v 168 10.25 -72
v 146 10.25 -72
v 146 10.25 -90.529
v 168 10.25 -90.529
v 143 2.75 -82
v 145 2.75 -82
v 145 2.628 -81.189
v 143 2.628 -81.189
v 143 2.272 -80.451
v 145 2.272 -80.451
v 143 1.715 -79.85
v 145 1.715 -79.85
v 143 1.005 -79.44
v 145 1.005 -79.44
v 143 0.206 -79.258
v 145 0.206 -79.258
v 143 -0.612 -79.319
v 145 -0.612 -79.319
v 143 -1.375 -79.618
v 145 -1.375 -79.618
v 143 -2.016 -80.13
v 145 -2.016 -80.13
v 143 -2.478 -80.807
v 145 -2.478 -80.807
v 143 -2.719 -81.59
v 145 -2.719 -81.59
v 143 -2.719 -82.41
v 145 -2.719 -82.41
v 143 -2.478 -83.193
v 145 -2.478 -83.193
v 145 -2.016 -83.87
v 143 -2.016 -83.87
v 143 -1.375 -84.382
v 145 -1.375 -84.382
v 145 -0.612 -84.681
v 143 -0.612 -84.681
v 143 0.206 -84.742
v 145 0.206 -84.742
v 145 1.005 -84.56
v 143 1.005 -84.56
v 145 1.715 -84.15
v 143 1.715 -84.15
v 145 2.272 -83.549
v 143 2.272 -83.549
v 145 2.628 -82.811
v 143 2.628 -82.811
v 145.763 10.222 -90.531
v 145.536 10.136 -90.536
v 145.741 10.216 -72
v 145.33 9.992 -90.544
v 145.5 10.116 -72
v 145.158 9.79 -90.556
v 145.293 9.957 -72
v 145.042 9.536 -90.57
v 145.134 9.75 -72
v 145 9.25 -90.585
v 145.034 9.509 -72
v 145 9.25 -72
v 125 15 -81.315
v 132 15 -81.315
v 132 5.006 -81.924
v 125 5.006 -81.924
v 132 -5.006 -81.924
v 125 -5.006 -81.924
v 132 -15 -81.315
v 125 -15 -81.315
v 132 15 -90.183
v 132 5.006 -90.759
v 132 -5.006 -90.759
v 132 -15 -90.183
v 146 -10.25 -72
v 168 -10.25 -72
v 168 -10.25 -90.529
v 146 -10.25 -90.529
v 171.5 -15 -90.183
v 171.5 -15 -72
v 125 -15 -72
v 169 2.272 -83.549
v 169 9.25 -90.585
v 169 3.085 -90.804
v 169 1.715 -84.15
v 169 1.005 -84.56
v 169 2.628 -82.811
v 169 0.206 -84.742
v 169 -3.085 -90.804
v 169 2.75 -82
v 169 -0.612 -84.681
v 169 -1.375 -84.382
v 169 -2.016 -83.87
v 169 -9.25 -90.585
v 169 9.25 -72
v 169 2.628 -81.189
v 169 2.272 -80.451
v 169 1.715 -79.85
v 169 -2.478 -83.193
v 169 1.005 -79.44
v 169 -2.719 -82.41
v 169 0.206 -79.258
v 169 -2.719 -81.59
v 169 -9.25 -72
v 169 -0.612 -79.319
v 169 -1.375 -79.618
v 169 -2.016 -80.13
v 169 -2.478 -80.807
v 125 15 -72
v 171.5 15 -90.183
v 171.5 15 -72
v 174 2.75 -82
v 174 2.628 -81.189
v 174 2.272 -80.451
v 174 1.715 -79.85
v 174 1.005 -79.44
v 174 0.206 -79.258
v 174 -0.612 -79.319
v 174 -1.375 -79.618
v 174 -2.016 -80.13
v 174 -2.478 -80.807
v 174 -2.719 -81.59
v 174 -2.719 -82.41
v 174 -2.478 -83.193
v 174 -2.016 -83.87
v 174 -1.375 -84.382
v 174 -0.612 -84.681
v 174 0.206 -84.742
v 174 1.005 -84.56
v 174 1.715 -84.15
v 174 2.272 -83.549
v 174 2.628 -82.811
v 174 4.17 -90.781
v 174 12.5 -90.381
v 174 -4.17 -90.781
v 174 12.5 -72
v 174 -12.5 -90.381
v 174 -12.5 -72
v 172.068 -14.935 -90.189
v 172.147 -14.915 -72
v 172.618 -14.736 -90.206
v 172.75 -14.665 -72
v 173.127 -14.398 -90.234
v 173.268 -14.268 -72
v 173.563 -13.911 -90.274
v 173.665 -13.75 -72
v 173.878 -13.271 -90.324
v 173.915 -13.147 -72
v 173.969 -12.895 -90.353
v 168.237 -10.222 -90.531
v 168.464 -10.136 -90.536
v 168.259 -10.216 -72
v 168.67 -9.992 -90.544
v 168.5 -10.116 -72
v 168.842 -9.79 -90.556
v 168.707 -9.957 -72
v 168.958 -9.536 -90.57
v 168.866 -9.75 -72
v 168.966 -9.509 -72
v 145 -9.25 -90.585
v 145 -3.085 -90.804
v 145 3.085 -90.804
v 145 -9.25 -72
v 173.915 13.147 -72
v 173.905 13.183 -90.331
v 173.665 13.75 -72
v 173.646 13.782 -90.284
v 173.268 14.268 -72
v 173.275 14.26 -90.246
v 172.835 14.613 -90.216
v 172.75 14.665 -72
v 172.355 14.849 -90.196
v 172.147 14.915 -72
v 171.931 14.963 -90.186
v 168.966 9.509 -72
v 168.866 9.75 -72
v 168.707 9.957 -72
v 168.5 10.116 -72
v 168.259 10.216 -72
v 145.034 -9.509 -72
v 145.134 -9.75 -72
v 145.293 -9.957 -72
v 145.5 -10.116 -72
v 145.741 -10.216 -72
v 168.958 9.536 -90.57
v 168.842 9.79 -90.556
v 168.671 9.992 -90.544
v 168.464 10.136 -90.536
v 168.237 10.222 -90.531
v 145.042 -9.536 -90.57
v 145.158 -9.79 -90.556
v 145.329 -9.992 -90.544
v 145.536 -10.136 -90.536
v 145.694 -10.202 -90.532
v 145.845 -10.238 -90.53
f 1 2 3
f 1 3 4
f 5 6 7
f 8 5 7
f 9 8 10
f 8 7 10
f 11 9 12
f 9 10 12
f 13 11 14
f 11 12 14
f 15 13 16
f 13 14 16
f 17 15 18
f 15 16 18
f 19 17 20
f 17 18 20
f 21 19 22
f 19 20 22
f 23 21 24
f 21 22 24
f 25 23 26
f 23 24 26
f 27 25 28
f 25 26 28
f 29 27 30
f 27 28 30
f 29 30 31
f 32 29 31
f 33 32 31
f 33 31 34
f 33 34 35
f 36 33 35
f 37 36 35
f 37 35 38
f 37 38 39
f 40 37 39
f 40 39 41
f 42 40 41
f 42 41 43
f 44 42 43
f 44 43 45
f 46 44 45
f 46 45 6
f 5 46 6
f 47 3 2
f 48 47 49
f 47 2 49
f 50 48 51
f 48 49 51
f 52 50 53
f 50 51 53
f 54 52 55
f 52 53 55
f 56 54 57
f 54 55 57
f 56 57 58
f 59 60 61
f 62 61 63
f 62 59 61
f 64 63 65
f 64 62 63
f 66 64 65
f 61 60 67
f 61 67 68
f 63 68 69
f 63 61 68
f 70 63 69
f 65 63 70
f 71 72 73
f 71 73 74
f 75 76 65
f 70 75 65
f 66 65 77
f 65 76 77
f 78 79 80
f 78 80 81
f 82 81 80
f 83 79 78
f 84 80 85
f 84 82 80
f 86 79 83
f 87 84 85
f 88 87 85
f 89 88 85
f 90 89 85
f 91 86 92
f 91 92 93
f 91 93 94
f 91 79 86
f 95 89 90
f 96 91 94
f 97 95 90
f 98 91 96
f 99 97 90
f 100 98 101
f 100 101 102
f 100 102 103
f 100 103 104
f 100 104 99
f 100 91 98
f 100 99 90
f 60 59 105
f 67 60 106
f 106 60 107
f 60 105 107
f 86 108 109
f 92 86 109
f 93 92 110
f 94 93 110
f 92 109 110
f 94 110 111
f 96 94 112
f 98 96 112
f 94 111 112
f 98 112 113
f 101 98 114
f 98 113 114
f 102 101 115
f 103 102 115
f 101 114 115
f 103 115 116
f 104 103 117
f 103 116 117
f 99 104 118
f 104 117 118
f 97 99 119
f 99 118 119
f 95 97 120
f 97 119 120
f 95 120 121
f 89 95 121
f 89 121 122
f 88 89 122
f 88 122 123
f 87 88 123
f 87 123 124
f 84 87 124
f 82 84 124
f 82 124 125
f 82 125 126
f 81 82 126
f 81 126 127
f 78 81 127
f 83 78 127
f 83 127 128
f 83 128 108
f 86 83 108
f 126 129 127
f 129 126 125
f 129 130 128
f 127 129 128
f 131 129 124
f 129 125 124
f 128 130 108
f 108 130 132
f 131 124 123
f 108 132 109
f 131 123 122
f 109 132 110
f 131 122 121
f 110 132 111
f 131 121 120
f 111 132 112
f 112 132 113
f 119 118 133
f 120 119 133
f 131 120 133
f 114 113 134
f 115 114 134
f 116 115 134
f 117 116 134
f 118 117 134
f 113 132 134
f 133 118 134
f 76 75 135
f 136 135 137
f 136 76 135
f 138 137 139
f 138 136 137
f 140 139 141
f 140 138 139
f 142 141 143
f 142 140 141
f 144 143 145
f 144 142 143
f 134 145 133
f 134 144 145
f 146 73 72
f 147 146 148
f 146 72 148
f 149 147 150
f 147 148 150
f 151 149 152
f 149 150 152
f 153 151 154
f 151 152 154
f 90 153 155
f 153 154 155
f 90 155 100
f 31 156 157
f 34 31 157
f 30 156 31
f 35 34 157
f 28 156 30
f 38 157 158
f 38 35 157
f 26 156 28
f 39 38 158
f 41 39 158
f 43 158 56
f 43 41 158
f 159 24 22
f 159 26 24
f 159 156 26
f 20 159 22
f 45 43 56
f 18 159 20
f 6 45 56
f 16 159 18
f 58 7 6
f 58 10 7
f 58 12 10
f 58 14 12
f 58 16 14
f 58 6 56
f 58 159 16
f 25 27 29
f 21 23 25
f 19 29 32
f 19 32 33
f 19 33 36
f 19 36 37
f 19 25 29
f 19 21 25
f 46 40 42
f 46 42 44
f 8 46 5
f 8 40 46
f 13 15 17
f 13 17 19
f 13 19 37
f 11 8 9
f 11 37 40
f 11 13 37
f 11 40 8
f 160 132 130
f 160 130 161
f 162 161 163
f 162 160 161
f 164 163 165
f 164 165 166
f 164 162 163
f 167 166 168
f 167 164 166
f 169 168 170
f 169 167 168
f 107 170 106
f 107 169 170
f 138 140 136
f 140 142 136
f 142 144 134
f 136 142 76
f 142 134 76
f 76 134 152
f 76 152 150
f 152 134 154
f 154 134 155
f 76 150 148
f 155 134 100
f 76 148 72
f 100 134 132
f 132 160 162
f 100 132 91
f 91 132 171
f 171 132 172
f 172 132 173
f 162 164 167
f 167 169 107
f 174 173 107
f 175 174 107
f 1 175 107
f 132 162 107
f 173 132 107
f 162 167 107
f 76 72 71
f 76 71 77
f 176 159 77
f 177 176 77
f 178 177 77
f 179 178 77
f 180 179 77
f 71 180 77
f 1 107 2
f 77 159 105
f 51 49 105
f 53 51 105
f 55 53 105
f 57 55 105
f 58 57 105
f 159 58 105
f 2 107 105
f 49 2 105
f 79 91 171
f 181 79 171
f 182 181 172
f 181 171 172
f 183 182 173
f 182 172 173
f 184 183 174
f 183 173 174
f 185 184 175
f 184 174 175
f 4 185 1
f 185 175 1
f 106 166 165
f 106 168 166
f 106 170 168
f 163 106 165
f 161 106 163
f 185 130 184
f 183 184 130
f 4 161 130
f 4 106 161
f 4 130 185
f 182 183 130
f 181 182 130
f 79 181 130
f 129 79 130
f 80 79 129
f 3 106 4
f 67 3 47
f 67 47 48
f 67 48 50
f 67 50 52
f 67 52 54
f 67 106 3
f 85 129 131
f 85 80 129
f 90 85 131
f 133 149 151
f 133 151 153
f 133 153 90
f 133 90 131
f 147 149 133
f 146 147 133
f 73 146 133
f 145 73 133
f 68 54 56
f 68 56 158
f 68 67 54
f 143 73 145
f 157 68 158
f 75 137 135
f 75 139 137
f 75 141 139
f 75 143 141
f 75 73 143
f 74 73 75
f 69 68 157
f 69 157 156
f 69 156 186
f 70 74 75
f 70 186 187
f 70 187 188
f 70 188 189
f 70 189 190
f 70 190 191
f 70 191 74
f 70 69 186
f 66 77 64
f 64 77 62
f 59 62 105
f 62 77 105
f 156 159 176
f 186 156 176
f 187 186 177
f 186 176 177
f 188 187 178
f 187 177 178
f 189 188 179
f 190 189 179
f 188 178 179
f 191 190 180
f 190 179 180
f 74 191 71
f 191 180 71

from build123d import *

# Parameters (mm, degrees)
PAD039_DEPTH    = 10
SKETCH109_R     = 200
SKETCH109_R_2   = 164.5
POCKET046_DEPTH = 7
SKETCH110_R     = 200
SKETCH110_R_2   = 173.831445
POCKET047_DEPTH = 49.001
SKETCH107_R     = 2.75
POCKET048_DEPTH = 32


with BuildPart() as part:
    # Sketch108 → Pad039 (new body, symmetric)
    with BuildSketch(Plane.XY):
        with BuildLine():
            Line((-32, 15), (14.5, 15))
            ThreePointArc((17, 12.5), (16.267767, 14.267767), (14.5, 15))
            Line((17, 12.5), (17, -12.5))
            ThreePointArc((14.5, -15), (16.267767, -14.267767), (17, -12.5))
            Line((14.5, -15), (-32, -15))
            Line((-32, -15), (-32, 15))
        make_face()
        with BuildLine():
            Line((-11, 10.25), (11, 10.25))
            ThreePointArc((12, 9.25), (11.707107, 9.957107), (11, 10.25))
            Line((12, 9.25), (12, -9.25))
            ThreePointArc((11, -10.25), (11.707107, -9.957107), (12, -9.25))
            Line((11, -10.25), (-11, -10.25))
            ThreePointArc((-12, -9.25), (-11.707107, -9.957107), (-11, -10.25))
            Line((-12, -9.25), (-12, 9.25))
            ThreePointArc((-11, 10.25), (-11.707107, 9.957107), (-12, 9.25))
        make_face(mode=Mode.SUBTRACT)
    extrude(amount=PAD039_DEPTH, both=True)

    # Sketch109 (on DatumPlane) → Pocket046 (cut)
    with BuildSketch(Plane(origin=(-32, 0, 0), x_dir=(0, -1, 0), z_dir=(-1, 0, 0))):
        with Locations((0, 164.5)):
            Circle(SKETCH109_R)
        with Locations((0, 164.5)):
            Circle(SKETCH109_R_2, mode=Mode.SUBTRACT)
    extrude(amount=-POCKET046_DEPTH, mode=Mode.SUBTRACT)

    # Sketch110 (on DatumPlane) → Pocket047 (cut, through all)
    with BuildSketch(Plane(origin=(-32, 0, 0), x_dir=(0, -1, 0), z_dir=(-1, 0, 0))):
        with Locations((0, 165)):
            Circle(SKETCH110_R)
        with Locations((0, 165)):
            Circle(SKETCH110_R_2, mode=Mode.SUBTRACT)
    extrude(amount=-POCKET047_DEPTH, mode=Mode.SUBTRACT)

    # Sketch107 → Pocket048 (cut)
    with BuildSketch(Plane.YZ.offset(18)):
        Circle(SKETCH107_R)
    extrude(amount=-POCKET048_DEPTH, mode=Mode.SUBTRACT)


with BuildPart() as part_1:
    # Body022022 placement: moved
    add(part.part.moved(Location((157, 0, -82))))


solid = part_1.part
